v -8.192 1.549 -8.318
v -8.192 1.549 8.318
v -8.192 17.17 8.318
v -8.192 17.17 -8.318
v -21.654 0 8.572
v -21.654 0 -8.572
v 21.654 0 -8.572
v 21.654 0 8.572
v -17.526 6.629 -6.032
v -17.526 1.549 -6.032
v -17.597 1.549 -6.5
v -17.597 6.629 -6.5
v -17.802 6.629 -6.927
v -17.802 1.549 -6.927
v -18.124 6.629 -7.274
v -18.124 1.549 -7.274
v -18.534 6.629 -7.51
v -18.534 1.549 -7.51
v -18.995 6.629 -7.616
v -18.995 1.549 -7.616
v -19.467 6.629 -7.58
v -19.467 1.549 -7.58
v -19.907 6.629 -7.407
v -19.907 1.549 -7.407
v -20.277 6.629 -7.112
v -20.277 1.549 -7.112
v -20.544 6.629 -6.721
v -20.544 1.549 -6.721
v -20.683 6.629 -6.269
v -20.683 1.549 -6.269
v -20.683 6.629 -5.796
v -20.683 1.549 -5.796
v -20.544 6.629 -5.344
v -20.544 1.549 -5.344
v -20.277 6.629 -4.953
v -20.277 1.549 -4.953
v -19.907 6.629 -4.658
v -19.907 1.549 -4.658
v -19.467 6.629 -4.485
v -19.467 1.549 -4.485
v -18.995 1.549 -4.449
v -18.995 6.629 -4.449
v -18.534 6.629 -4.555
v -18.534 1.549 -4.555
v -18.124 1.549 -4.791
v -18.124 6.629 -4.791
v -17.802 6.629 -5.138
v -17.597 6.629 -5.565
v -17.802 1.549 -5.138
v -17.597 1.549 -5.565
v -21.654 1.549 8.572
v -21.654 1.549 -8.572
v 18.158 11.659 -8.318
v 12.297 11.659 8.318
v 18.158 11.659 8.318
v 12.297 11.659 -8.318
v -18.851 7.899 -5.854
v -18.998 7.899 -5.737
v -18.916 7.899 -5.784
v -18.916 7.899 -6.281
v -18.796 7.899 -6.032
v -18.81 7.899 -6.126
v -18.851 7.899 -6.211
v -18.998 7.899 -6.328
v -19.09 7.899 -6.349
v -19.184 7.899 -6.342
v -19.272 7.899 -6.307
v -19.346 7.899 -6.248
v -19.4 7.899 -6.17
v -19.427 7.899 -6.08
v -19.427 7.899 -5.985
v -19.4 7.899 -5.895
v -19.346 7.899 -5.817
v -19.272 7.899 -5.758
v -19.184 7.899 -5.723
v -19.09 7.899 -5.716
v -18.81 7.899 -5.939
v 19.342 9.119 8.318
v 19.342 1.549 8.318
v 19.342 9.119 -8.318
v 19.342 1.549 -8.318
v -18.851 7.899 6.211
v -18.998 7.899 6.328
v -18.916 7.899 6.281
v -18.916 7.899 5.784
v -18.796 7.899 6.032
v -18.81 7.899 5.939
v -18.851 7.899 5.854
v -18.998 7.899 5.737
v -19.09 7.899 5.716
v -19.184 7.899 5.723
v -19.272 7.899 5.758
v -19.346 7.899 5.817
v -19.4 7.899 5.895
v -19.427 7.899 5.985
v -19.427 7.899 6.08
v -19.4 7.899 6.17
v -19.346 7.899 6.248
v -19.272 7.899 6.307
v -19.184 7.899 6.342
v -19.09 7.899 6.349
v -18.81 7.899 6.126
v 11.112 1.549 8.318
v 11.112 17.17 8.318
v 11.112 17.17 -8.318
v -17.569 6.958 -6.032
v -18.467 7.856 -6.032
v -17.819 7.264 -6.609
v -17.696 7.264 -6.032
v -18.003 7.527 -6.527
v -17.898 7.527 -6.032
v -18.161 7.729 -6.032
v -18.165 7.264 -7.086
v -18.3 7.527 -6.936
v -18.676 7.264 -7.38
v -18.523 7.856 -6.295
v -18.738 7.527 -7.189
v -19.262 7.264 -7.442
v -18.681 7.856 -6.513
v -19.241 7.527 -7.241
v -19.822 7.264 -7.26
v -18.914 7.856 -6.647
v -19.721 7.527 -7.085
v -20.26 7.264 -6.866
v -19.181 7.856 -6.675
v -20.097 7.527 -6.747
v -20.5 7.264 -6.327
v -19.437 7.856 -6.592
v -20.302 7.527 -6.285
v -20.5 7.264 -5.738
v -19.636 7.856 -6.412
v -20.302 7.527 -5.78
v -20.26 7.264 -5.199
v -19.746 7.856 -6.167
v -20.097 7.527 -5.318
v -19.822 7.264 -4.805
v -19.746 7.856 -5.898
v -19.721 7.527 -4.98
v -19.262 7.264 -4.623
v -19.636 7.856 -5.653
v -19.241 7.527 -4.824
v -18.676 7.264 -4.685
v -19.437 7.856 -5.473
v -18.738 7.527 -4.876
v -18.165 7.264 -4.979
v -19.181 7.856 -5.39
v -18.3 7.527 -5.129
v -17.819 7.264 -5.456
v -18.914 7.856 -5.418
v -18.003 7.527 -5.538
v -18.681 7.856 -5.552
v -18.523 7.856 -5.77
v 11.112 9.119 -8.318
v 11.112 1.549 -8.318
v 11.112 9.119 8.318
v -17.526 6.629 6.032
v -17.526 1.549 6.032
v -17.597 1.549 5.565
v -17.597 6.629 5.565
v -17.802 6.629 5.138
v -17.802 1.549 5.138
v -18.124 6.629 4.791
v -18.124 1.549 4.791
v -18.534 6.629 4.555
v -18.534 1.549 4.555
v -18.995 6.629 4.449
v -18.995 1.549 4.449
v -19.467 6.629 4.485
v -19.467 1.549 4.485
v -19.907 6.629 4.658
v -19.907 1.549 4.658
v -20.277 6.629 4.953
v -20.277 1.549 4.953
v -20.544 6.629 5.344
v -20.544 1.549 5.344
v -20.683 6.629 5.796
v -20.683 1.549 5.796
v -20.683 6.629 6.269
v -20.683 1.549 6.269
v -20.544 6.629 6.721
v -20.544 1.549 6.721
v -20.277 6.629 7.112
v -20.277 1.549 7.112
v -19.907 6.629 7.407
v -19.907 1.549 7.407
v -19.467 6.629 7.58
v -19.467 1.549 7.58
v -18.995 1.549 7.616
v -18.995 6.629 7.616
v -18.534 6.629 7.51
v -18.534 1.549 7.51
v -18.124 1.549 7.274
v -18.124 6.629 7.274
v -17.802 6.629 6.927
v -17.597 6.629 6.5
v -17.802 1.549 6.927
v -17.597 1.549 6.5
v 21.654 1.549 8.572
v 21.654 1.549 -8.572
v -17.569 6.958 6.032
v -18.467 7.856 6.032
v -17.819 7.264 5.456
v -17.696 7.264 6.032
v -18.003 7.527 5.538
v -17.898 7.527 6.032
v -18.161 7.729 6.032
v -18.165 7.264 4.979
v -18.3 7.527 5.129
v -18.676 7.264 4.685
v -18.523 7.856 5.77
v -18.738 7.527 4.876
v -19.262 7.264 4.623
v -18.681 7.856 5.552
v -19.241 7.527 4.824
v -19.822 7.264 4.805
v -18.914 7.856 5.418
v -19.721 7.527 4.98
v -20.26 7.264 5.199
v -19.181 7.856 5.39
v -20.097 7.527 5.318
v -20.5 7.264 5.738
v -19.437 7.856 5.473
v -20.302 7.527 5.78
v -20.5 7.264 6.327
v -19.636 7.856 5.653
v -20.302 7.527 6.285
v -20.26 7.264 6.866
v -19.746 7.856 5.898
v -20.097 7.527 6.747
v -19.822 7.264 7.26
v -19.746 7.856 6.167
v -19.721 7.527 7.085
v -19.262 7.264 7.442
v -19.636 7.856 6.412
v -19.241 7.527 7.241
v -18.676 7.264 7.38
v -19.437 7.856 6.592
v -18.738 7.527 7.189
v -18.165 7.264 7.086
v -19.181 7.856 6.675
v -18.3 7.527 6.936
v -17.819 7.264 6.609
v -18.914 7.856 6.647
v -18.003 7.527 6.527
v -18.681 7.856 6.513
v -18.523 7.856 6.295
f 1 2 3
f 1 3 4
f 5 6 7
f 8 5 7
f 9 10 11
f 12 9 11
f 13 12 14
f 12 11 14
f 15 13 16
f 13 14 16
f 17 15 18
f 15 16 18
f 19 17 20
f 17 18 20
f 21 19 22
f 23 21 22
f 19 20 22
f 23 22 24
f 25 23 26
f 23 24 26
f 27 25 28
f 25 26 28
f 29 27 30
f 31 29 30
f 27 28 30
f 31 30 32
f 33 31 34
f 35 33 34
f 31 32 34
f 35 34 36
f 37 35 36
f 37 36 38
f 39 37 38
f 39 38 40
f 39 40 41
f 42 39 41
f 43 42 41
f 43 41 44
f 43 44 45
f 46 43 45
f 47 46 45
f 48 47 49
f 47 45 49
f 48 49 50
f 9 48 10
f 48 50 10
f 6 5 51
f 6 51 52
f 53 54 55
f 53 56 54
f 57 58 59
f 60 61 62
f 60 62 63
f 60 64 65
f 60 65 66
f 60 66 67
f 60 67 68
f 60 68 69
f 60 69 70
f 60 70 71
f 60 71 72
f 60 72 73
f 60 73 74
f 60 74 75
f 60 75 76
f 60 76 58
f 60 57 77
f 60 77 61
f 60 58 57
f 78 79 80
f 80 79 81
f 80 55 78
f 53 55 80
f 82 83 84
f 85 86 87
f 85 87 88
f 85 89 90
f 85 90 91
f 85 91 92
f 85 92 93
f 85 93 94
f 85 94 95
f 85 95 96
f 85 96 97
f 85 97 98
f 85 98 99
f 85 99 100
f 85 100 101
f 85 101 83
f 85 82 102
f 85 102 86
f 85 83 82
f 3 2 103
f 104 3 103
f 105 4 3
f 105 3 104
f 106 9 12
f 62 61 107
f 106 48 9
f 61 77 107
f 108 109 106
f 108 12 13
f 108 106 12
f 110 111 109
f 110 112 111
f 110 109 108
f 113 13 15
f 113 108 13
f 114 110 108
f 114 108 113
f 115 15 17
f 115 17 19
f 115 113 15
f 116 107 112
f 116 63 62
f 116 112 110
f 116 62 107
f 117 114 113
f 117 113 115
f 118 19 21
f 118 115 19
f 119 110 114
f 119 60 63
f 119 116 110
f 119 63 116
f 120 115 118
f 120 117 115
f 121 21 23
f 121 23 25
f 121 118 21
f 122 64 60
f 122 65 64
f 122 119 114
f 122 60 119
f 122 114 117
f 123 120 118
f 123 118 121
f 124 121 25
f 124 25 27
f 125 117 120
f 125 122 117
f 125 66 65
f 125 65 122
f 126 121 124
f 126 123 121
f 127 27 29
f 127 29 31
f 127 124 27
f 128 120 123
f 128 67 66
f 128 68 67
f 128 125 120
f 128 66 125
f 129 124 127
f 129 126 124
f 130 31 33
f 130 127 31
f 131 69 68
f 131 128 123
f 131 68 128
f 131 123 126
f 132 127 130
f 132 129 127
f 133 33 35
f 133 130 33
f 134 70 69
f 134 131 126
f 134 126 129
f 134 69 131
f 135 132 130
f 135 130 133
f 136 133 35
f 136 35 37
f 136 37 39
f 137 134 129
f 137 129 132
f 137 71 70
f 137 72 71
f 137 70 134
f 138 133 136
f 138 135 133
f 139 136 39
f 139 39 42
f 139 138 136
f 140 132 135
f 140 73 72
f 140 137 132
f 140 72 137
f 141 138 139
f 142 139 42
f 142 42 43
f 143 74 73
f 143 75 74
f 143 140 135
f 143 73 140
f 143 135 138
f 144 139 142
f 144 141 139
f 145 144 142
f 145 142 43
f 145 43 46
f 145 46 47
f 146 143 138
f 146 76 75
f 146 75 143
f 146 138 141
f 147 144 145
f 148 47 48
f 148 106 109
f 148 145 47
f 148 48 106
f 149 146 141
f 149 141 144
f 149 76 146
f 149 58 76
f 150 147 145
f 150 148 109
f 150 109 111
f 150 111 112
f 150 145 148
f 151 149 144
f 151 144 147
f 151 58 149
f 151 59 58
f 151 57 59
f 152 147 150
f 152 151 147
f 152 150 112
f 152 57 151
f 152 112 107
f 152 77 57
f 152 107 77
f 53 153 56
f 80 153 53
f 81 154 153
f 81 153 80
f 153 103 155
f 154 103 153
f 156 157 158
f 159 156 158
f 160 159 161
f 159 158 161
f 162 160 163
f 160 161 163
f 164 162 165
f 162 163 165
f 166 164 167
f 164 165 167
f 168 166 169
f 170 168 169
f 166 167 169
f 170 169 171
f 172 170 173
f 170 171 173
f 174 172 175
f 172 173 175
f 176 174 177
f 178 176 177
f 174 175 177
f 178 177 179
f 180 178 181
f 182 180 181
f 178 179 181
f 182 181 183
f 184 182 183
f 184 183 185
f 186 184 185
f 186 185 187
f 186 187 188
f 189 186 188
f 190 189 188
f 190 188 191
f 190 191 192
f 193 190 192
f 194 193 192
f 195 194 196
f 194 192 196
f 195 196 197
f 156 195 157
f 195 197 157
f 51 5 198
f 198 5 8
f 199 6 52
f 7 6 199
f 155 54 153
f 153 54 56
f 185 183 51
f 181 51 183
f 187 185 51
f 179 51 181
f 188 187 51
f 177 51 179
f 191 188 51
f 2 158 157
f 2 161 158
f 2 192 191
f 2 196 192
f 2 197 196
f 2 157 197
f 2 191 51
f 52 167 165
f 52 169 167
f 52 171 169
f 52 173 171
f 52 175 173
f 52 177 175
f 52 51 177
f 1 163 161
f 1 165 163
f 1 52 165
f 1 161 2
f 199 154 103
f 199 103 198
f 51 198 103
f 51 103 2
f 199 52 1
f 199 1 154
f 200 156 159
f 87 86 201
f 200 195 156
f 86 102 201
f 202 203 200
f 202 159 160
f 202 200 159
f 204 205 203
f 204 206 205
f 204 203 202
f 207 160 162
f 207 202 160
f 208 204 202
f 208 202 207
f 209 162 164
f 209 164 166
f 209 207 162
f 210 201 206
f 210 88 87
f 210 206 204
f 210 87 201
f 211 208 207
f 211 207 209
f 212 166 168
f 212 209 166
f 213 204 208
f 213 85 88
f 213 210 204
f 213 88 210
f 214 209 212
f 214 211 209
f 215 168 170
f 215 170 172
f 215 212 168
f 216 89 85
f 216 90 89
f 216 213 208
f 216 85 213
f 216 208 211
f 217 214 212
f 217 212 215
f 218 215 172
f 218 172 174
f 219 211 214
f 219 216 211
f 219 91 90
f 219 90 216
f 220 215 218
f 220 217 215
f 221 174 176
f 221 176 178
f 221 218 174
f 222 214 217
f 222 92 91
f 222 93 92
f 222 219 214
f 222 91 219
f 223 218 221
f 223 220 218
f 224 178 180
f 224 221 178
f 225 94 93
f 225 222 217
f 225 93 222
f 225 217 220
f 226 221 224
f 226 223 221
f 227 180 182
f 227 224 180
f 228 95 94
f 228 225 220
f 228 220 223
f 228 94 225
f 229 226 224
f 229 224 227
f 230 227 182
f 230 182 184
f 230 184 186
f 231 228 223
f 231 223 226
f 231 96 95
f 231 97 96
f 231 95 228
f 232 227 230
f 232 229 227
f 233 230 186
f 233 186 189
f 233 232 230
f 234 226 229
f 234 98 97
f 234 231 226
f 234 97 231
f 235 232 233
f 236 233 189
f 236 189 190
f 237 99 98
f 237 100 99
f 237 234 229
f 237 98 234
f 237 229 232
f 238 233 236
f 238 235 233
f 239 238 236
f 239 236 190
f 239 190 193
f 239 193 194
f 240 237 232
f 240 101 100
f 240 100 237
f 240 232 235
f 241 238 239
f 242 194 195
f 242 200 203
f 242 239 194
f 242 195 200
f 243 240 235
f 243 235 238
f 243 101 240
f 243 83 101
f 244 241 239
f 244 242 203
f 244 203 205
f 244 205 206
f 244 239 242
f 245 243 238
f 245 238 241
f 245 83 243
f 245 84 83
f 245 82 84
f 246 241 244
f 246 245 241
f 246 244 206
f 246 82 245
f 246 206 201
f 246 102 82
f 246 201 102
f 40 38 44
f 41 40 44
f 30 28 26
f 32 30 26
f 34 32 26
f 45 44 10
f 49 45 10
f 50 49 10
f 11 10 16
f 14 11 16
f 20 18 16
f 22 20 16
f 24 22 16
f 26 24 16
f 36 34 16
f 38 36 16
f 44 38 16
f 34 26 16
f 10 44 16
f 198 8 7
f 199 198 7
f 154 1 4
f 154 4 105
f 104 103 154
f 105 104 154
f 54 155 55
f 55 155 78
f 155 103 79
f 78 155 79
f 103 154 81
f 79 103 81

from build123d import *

# Parameters (mm, degrees)
SKETCH1_W             = 43.307
SKETCH1_H             = 17.145
BOSS_EXTRUDE1_DEPTH   = 1.5494
SKETCH2_W             = 19.304
SKETCH2_H             = 16.637
BOSS_EXTRUDE2_DEPTH   = 15.621
SKETCH3_W             = 8.2296
SKETCH3_H             = 16.637
BOSS_EXTRUDE3_DEPTH   = 10.1092
CHAMFER1_SIZE         = 2.54
CHAMFER1_SIZE2        = 1.184421452
CHAMFER1_PART_2_SIZE  = 2.54
CHAMFER1_PART_2_SIZE2 = 1.184421452
SKETCH4_R             = 1.5875
BOSS_EXTRUDE4_DEPTH   = 6.35
FILLET2_R             = 1.27
SKETCH5_R             = 1.5875
BOSS_EXTRUDE5_DEPTH   = 6.35
FILLET1_R             = 1.27


with BuildPart() as part:
    # Sketch1 → Boss-Extrude1 (new body)
    with BuildSketch(Plane(origin=(0, 0, 0), x_dir=(1, 0, 0), z_dir=(0, 1, 0))):
        Rectangle(SKETCH1_W, SKETCH1_H)
    extrude(amount=BOSS_EXTRUDE1_DEPTH)

    # Sketch2 → Boss-Extrude2 (add)
    with BuildSketch(Plane(origin=(0, 1.5494, 0), x_dir=(1, 0, 0), z_dir=(0, 1, 0))):
        with Locations((1.4605, 0)):
            Rectangle(SKETCH2_W, SKETCH2_H)
    extrude(amount=BOSS_EXTRUDE2_DEPTH)

    # Sketch5 → Boss-Extrude5 (add)
    with BuildSketch(Plane(origin=(0, 1.5494, 0), x_dir=(1, 0, 0), z_dir=(0, 1, 0))):
        with Locations((-19.1135, -6.0325)):
            Circle(SKETCH5_R)
    extrude(amount=BOSS_EXTRUDE5_DEPTH)

    # Fillet1
    fillet1_edges = [part.edges().sort_by_distance(p)[0] for p in [
        (-20.701, 7.8994, 6.0325),
    ]]
    fillet(fillet1_edges, radius=FILLET1_R)


with BuildPart() as body_2:
    # Sketch3 → Boss-Extrude3 (new body)
    with BuildSketch(Plane(origin=(0, 1.5494, 0), x_dir=(1, 0, 0), z_dir=(0, 1, 0))):
        with Locations((15.2273, 0)):
            Rectangle(SKETCH3_W, SKETCH3_H)
    extrude(amount=BOSS_EXTRUDE3_DEPTH)

    # Chamfer1
    chamfer1_edges = [body_2.edges().sort_by_distance(p)[0] for p in [
        (19.3421, 11.6586, 0),
    ]]
    chamfer1_side = [body_2.faces().sort_by_distance(p)[0] for p in [
        (19.3421, 6.604, 0),
    ]]
    chamfer(chamfer1_edges, length=CHAMFER1_SIZE, length2=CHAMFER1_SIZE2, reference=chamfer1_side[0])

    # Chamfer1 part 2
    chamfer1_part_2_edges = [body_2.edges().sort_by_distance(p)[0] for p in [
        (11.1125, 11.6586, 0),
    ]]
    chamfer1_part_2_side = [body_2.faces().sort_by_distance(p)[0] for p in [
        (11.1125, 6.604, 0),
    ]]
    chamfer(chamfer1_part_2_edges, length=CHAMFER1_PART_2_SIZE, length2=CHAMFER1_PART_2_SIZE2, reference=chamfer1_part_2_side[0])


with BuildPart() as body_3:
    # Sketch4 → Boss-Extrude4 (new body)
    with BuildSketch(Plane(origin=(0, 1.5494, 0), x_dir=(1, 0, 0), z_dir=(0, 1, 0))):
        with Locations((-19.1135, 6.0325)):
            Circle(SKETCH4_R)
    extrude(amount=BOSS_EXTRUDE4_DEPTH)

    # Fillet2
    fillet2_edges = [body_3.edges().sort_by_distance(p)[0] for p in [
        (-20.701, 7.8994, -6.0325),
    ]]
    fillet(fillet2_edges, radius=FILLET2_R)


solid = Compound([part.part, body_2.part, body_3.part])
